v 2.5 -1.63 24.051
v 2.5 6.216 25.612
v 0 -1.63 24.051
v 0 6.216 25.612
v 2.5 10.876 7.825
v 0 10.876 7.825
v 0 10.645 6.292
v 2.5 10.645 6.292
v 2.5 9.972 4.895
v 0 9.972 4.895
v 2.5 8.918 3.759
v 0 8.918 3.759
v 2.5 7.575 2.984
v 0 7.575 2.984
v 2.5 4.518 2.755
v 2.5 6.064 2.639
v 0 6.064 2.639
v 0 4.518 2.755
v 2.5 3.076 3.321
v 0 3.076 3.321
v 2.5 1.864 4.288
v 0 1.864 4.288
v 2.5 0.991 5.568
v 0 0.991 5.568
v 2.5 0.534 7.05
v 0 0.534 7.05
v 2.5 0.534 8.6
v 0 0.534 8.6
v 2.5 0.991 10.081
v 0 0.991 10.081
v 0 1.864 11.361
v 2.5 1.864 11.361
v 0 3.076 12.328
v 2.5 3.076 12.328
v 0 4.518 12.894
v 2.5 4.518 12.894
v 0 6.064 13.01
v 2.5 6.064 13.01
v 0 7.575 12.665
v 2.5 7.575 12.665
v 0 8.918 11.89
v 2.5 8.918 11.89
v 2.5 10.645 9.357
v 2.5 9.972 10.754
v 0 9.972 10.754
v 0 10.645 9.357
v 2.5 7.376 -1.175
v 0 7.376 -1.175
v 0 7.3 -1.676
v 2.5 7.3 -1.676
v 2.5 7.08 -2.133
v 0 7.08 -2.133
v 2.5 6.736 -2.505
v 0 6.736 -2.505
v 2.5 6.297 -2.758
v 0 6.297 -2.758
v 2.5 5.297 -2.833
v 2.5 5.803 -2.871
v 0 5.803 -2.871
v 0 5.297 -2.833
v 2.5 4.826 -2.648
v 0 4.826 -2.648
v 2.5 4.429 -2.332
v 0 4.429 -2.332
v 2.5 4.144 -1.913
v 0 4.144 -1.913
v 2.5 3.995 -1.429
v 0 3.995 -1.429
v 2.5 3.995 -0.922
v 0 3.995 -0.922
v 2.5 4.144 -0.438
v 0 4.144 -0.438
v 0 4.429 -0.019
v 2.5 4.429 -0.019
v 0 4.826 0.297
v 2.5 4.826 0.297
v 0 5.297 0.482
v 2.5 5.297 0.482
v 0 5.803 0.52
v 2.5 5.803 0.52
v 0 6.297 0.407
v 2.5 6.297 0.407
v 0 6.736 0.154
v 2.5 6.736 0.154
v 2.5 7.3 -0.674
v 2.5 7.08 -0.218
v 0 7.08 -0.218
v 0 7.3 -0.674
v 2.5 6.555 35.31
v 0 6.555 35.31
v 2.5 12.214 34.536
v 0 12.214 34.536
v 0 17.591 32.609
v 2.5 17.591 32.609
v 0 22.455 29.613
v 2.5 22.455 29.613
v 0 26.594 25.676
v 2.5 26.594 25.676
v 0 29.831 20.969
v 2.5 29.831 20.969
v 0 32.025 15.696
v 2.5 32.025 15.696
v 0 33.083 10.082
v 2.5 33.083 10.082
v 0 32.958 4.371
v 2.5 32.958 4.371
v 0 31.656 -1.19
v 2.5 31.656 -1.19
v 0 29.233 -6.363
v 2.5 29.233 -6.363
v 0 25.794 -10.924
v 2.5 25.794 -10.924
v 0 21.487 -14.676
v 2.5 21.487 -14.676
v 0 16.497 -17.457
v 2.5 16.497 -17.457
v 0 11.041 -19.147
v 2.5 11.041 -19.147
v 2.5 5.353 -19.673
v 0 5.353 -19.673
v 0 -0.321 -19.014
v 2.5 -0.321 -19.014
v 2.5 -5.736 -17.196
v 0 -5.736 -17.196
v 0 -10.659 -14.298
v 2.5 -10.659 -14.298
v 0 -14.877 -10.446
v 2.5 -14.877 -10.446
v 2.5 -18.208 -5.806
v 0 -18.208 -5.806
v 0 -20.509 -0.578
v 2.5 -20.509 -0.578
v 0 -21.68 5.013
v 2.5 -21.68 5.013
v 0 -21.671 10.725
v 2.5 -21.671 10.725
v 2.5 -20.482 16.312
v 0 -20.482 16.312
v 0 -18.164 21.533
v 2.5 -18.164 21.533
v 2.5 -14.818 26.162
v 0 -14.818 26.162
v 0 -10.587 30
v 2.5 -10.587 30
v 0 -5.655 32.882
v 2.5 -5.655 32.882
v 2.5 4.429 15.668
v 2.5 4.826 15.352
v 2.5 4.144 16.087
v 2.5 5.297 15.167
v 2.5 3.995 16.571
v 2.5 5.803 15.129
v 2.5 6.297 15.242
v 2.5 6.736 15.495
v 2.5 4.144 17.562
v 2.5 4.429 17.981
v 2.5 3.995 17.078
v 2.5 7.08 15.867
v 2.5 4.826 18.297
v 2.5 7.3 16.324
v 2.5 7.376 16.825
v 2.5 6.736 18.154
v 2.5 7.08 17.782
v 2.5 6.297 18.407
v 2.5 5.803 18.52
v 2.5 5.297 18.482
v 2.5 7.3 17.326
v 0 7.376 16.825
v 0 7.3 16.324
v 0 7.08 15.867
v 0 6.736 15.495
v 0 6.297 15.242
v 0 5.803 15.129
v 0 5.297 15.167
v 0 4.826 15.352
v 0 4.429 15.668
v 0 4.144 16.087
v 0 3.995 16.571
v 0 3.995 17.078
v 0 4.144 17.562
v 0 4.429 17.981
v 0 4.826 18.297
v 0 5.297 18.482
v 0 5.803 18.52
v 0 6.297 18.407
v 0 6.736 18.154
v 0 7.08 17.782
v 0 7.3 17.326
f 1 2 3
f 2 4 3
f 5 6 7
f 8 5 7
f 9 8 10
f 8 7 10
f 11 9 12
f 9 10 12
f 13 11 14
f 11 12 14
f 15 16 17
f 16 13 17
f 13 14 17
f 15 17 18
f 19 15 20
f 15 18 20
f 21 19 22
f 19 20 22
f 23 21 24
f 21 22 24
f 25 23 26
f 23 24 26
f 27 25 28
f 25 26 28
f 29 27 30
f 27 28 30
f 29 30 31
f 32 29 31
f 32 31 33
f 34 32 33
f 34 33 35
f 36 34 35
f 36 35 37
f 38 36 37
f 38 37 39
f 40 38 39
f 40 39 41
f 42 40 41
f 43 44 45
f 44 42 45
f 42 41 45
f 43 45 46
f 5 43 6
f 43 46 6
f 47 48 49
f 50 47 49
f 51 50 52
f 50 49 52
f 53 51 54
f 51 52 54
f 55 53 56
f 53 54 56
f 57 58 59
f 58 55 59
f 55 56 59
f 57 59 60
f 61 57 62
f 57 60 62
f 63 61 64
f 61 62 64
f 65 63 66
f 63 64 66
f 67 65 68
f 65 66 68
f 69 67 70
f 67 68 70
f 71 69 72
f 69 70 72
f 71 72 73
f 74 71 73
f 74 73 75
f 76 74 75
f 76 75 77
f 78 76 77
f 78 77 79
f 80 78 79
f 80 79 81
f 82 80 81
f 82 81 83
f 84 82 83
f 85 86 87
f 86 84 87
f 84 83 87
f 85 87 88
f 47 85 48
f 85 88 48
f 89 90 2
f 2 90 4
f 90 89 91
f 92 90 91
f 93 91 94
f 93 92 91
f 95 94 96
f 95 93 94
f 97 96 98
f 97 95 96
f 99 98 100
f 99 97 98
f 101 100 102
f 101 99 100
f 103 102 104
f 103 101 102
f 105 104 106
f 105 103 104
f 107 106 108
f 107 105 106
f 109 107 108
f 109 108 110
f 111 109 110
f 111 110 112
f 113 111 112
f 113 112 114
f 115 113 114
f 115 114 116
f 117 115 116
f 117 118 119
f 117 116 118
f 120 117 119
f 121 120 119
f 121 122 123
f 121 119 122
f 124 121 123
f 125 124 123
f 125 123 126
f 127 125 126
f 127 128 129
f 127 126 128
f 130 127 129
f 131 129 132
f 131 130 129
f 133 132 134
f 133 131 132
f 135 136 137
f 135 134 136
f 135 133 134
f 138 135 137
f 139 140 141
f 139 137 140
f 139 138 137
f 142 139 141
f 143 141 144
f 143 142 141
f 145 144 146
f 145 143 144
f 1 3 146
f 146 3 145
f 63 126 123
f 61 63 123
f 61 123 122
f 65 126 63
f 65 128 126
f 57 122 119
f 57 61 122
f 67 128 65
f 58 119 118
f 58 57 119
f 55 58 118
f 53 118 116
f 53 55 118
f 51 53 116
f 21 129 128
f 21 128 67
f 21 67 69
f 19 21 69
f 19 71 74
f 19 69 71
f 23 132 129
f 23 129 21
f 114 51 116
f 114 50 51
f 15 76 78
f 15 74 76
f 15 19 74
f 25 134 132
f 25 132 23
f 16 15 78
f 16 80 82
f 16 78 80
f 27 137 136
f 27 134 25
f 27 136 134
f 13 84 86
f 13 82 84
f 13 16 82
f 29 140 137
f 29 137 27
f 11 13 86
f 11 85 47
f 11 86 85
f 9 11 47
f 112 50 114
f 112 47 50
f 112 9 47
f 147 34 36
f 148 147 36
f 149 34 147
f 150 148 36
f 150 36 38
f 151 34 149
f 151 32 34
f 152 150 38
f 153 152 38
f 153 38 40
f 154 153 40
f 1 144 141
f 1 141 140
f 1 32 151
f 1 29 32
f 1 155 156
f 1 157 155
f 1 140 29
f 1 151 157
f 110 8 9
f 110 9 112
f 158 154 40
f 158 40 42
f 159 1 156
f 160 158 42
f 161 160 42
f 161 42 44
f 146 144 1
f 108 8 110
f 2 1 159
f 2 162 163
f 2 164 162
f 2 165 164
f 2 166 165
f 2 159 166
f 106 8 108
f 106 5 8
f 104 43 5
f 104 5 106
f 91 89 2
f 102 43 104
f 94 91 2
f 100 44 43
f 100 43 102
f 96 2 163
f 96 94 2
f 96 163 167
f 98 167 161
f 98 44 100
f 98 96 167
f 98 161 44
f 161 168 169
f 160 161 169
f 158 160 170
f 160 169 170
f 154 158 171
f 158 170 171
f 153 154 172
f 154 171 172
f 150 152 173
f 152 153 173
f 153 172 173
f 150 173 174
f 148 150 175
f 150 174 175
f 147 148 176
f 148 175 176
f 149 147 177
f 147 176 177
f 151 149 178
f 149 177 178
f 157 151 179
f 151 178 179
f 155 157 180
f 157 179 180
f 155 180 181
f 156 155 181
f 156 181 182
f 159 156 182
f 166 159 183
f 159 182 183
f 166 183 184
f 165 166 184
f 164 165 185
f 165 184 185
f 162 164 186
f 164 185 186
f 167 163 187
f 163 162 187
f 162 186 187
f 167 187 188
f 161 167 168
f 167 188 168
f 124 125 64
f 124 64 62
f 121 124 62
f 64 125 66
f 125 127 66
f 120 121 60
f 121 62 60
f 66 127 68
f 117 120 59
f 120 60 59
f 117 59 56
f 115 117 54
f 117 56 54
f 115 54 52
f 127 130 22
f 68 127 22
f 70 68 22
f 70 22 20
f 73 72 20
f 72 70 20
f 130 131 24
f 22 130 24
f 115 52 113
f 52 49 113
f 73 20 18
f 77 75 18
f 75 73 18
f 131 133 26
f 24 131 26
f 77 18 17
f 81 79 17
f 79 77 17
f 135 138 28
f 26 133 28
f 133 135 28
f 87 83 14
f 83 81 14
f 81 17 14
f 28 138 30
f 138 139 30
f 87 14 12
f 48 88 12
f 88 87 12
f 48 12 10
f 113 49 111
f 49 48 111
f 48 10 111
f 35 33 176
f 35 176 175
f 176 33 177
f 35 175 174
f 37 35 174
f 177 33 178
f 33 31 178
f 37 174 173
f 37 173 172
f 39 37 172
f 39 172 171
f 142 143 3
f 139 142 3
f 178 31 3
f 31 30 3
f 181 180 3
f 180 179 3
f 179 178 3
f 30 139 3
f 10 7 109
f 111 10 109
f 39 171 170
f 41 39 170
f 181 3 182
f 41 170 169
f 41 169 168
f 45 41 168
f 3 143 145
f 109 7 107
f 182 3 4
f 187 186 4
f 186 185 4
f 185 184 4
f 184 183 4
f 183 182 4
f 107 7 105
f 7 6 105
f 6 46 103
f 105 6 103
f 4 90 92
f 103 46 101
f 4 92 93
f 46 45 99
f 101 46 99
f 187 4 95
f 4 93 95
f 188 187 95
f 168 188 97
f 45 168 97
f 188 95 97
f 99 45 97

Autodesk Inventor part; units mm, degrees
ref_plane "YZ Plane" through (0, 0, 0) normal (1, 0, 0) x (0, 1, 0)
ref_plane "XZ Plane" through (0, 0, 0) normal (0, 1, 0) x (-1, 0, 0)
ref_plane "XY Plane" through (0, 0, 0) normal (0, 0, 1) x (1, 0, 0)
sketch "スケッチ1" plane through (0, 0, 0) normal (1, 0, 0) x (0, 1, 0)
  arc A0 (-5.655, 32.8818) -> (6.5548, 35.3105) centre (5.6756, 7.8246) ccw
  circle A1 centre (5.6756, -1.1754) radius 1.7
  circle A2 centre (5.6756, 16.8246) radius 1.7
  circle A3 centre (5.6756, 7.8246) radius 5.2
  line L0 (-1.6304, 24.0509) -> (-5.655, 32.8818)
  line L1 (6.5548, 35.3105) -> (6.2159, 25.6116)
  line L2 (6.2159, 25.6116) -> (-1.6304, 24.0509)
  point P0 (0, 0)
extrude "押し出し1" add sketch "スケッチ1" along normal blind 2.5
properties part number "belt_liner_v2_3DP_P-1-F" material "ABS プラスチック"
